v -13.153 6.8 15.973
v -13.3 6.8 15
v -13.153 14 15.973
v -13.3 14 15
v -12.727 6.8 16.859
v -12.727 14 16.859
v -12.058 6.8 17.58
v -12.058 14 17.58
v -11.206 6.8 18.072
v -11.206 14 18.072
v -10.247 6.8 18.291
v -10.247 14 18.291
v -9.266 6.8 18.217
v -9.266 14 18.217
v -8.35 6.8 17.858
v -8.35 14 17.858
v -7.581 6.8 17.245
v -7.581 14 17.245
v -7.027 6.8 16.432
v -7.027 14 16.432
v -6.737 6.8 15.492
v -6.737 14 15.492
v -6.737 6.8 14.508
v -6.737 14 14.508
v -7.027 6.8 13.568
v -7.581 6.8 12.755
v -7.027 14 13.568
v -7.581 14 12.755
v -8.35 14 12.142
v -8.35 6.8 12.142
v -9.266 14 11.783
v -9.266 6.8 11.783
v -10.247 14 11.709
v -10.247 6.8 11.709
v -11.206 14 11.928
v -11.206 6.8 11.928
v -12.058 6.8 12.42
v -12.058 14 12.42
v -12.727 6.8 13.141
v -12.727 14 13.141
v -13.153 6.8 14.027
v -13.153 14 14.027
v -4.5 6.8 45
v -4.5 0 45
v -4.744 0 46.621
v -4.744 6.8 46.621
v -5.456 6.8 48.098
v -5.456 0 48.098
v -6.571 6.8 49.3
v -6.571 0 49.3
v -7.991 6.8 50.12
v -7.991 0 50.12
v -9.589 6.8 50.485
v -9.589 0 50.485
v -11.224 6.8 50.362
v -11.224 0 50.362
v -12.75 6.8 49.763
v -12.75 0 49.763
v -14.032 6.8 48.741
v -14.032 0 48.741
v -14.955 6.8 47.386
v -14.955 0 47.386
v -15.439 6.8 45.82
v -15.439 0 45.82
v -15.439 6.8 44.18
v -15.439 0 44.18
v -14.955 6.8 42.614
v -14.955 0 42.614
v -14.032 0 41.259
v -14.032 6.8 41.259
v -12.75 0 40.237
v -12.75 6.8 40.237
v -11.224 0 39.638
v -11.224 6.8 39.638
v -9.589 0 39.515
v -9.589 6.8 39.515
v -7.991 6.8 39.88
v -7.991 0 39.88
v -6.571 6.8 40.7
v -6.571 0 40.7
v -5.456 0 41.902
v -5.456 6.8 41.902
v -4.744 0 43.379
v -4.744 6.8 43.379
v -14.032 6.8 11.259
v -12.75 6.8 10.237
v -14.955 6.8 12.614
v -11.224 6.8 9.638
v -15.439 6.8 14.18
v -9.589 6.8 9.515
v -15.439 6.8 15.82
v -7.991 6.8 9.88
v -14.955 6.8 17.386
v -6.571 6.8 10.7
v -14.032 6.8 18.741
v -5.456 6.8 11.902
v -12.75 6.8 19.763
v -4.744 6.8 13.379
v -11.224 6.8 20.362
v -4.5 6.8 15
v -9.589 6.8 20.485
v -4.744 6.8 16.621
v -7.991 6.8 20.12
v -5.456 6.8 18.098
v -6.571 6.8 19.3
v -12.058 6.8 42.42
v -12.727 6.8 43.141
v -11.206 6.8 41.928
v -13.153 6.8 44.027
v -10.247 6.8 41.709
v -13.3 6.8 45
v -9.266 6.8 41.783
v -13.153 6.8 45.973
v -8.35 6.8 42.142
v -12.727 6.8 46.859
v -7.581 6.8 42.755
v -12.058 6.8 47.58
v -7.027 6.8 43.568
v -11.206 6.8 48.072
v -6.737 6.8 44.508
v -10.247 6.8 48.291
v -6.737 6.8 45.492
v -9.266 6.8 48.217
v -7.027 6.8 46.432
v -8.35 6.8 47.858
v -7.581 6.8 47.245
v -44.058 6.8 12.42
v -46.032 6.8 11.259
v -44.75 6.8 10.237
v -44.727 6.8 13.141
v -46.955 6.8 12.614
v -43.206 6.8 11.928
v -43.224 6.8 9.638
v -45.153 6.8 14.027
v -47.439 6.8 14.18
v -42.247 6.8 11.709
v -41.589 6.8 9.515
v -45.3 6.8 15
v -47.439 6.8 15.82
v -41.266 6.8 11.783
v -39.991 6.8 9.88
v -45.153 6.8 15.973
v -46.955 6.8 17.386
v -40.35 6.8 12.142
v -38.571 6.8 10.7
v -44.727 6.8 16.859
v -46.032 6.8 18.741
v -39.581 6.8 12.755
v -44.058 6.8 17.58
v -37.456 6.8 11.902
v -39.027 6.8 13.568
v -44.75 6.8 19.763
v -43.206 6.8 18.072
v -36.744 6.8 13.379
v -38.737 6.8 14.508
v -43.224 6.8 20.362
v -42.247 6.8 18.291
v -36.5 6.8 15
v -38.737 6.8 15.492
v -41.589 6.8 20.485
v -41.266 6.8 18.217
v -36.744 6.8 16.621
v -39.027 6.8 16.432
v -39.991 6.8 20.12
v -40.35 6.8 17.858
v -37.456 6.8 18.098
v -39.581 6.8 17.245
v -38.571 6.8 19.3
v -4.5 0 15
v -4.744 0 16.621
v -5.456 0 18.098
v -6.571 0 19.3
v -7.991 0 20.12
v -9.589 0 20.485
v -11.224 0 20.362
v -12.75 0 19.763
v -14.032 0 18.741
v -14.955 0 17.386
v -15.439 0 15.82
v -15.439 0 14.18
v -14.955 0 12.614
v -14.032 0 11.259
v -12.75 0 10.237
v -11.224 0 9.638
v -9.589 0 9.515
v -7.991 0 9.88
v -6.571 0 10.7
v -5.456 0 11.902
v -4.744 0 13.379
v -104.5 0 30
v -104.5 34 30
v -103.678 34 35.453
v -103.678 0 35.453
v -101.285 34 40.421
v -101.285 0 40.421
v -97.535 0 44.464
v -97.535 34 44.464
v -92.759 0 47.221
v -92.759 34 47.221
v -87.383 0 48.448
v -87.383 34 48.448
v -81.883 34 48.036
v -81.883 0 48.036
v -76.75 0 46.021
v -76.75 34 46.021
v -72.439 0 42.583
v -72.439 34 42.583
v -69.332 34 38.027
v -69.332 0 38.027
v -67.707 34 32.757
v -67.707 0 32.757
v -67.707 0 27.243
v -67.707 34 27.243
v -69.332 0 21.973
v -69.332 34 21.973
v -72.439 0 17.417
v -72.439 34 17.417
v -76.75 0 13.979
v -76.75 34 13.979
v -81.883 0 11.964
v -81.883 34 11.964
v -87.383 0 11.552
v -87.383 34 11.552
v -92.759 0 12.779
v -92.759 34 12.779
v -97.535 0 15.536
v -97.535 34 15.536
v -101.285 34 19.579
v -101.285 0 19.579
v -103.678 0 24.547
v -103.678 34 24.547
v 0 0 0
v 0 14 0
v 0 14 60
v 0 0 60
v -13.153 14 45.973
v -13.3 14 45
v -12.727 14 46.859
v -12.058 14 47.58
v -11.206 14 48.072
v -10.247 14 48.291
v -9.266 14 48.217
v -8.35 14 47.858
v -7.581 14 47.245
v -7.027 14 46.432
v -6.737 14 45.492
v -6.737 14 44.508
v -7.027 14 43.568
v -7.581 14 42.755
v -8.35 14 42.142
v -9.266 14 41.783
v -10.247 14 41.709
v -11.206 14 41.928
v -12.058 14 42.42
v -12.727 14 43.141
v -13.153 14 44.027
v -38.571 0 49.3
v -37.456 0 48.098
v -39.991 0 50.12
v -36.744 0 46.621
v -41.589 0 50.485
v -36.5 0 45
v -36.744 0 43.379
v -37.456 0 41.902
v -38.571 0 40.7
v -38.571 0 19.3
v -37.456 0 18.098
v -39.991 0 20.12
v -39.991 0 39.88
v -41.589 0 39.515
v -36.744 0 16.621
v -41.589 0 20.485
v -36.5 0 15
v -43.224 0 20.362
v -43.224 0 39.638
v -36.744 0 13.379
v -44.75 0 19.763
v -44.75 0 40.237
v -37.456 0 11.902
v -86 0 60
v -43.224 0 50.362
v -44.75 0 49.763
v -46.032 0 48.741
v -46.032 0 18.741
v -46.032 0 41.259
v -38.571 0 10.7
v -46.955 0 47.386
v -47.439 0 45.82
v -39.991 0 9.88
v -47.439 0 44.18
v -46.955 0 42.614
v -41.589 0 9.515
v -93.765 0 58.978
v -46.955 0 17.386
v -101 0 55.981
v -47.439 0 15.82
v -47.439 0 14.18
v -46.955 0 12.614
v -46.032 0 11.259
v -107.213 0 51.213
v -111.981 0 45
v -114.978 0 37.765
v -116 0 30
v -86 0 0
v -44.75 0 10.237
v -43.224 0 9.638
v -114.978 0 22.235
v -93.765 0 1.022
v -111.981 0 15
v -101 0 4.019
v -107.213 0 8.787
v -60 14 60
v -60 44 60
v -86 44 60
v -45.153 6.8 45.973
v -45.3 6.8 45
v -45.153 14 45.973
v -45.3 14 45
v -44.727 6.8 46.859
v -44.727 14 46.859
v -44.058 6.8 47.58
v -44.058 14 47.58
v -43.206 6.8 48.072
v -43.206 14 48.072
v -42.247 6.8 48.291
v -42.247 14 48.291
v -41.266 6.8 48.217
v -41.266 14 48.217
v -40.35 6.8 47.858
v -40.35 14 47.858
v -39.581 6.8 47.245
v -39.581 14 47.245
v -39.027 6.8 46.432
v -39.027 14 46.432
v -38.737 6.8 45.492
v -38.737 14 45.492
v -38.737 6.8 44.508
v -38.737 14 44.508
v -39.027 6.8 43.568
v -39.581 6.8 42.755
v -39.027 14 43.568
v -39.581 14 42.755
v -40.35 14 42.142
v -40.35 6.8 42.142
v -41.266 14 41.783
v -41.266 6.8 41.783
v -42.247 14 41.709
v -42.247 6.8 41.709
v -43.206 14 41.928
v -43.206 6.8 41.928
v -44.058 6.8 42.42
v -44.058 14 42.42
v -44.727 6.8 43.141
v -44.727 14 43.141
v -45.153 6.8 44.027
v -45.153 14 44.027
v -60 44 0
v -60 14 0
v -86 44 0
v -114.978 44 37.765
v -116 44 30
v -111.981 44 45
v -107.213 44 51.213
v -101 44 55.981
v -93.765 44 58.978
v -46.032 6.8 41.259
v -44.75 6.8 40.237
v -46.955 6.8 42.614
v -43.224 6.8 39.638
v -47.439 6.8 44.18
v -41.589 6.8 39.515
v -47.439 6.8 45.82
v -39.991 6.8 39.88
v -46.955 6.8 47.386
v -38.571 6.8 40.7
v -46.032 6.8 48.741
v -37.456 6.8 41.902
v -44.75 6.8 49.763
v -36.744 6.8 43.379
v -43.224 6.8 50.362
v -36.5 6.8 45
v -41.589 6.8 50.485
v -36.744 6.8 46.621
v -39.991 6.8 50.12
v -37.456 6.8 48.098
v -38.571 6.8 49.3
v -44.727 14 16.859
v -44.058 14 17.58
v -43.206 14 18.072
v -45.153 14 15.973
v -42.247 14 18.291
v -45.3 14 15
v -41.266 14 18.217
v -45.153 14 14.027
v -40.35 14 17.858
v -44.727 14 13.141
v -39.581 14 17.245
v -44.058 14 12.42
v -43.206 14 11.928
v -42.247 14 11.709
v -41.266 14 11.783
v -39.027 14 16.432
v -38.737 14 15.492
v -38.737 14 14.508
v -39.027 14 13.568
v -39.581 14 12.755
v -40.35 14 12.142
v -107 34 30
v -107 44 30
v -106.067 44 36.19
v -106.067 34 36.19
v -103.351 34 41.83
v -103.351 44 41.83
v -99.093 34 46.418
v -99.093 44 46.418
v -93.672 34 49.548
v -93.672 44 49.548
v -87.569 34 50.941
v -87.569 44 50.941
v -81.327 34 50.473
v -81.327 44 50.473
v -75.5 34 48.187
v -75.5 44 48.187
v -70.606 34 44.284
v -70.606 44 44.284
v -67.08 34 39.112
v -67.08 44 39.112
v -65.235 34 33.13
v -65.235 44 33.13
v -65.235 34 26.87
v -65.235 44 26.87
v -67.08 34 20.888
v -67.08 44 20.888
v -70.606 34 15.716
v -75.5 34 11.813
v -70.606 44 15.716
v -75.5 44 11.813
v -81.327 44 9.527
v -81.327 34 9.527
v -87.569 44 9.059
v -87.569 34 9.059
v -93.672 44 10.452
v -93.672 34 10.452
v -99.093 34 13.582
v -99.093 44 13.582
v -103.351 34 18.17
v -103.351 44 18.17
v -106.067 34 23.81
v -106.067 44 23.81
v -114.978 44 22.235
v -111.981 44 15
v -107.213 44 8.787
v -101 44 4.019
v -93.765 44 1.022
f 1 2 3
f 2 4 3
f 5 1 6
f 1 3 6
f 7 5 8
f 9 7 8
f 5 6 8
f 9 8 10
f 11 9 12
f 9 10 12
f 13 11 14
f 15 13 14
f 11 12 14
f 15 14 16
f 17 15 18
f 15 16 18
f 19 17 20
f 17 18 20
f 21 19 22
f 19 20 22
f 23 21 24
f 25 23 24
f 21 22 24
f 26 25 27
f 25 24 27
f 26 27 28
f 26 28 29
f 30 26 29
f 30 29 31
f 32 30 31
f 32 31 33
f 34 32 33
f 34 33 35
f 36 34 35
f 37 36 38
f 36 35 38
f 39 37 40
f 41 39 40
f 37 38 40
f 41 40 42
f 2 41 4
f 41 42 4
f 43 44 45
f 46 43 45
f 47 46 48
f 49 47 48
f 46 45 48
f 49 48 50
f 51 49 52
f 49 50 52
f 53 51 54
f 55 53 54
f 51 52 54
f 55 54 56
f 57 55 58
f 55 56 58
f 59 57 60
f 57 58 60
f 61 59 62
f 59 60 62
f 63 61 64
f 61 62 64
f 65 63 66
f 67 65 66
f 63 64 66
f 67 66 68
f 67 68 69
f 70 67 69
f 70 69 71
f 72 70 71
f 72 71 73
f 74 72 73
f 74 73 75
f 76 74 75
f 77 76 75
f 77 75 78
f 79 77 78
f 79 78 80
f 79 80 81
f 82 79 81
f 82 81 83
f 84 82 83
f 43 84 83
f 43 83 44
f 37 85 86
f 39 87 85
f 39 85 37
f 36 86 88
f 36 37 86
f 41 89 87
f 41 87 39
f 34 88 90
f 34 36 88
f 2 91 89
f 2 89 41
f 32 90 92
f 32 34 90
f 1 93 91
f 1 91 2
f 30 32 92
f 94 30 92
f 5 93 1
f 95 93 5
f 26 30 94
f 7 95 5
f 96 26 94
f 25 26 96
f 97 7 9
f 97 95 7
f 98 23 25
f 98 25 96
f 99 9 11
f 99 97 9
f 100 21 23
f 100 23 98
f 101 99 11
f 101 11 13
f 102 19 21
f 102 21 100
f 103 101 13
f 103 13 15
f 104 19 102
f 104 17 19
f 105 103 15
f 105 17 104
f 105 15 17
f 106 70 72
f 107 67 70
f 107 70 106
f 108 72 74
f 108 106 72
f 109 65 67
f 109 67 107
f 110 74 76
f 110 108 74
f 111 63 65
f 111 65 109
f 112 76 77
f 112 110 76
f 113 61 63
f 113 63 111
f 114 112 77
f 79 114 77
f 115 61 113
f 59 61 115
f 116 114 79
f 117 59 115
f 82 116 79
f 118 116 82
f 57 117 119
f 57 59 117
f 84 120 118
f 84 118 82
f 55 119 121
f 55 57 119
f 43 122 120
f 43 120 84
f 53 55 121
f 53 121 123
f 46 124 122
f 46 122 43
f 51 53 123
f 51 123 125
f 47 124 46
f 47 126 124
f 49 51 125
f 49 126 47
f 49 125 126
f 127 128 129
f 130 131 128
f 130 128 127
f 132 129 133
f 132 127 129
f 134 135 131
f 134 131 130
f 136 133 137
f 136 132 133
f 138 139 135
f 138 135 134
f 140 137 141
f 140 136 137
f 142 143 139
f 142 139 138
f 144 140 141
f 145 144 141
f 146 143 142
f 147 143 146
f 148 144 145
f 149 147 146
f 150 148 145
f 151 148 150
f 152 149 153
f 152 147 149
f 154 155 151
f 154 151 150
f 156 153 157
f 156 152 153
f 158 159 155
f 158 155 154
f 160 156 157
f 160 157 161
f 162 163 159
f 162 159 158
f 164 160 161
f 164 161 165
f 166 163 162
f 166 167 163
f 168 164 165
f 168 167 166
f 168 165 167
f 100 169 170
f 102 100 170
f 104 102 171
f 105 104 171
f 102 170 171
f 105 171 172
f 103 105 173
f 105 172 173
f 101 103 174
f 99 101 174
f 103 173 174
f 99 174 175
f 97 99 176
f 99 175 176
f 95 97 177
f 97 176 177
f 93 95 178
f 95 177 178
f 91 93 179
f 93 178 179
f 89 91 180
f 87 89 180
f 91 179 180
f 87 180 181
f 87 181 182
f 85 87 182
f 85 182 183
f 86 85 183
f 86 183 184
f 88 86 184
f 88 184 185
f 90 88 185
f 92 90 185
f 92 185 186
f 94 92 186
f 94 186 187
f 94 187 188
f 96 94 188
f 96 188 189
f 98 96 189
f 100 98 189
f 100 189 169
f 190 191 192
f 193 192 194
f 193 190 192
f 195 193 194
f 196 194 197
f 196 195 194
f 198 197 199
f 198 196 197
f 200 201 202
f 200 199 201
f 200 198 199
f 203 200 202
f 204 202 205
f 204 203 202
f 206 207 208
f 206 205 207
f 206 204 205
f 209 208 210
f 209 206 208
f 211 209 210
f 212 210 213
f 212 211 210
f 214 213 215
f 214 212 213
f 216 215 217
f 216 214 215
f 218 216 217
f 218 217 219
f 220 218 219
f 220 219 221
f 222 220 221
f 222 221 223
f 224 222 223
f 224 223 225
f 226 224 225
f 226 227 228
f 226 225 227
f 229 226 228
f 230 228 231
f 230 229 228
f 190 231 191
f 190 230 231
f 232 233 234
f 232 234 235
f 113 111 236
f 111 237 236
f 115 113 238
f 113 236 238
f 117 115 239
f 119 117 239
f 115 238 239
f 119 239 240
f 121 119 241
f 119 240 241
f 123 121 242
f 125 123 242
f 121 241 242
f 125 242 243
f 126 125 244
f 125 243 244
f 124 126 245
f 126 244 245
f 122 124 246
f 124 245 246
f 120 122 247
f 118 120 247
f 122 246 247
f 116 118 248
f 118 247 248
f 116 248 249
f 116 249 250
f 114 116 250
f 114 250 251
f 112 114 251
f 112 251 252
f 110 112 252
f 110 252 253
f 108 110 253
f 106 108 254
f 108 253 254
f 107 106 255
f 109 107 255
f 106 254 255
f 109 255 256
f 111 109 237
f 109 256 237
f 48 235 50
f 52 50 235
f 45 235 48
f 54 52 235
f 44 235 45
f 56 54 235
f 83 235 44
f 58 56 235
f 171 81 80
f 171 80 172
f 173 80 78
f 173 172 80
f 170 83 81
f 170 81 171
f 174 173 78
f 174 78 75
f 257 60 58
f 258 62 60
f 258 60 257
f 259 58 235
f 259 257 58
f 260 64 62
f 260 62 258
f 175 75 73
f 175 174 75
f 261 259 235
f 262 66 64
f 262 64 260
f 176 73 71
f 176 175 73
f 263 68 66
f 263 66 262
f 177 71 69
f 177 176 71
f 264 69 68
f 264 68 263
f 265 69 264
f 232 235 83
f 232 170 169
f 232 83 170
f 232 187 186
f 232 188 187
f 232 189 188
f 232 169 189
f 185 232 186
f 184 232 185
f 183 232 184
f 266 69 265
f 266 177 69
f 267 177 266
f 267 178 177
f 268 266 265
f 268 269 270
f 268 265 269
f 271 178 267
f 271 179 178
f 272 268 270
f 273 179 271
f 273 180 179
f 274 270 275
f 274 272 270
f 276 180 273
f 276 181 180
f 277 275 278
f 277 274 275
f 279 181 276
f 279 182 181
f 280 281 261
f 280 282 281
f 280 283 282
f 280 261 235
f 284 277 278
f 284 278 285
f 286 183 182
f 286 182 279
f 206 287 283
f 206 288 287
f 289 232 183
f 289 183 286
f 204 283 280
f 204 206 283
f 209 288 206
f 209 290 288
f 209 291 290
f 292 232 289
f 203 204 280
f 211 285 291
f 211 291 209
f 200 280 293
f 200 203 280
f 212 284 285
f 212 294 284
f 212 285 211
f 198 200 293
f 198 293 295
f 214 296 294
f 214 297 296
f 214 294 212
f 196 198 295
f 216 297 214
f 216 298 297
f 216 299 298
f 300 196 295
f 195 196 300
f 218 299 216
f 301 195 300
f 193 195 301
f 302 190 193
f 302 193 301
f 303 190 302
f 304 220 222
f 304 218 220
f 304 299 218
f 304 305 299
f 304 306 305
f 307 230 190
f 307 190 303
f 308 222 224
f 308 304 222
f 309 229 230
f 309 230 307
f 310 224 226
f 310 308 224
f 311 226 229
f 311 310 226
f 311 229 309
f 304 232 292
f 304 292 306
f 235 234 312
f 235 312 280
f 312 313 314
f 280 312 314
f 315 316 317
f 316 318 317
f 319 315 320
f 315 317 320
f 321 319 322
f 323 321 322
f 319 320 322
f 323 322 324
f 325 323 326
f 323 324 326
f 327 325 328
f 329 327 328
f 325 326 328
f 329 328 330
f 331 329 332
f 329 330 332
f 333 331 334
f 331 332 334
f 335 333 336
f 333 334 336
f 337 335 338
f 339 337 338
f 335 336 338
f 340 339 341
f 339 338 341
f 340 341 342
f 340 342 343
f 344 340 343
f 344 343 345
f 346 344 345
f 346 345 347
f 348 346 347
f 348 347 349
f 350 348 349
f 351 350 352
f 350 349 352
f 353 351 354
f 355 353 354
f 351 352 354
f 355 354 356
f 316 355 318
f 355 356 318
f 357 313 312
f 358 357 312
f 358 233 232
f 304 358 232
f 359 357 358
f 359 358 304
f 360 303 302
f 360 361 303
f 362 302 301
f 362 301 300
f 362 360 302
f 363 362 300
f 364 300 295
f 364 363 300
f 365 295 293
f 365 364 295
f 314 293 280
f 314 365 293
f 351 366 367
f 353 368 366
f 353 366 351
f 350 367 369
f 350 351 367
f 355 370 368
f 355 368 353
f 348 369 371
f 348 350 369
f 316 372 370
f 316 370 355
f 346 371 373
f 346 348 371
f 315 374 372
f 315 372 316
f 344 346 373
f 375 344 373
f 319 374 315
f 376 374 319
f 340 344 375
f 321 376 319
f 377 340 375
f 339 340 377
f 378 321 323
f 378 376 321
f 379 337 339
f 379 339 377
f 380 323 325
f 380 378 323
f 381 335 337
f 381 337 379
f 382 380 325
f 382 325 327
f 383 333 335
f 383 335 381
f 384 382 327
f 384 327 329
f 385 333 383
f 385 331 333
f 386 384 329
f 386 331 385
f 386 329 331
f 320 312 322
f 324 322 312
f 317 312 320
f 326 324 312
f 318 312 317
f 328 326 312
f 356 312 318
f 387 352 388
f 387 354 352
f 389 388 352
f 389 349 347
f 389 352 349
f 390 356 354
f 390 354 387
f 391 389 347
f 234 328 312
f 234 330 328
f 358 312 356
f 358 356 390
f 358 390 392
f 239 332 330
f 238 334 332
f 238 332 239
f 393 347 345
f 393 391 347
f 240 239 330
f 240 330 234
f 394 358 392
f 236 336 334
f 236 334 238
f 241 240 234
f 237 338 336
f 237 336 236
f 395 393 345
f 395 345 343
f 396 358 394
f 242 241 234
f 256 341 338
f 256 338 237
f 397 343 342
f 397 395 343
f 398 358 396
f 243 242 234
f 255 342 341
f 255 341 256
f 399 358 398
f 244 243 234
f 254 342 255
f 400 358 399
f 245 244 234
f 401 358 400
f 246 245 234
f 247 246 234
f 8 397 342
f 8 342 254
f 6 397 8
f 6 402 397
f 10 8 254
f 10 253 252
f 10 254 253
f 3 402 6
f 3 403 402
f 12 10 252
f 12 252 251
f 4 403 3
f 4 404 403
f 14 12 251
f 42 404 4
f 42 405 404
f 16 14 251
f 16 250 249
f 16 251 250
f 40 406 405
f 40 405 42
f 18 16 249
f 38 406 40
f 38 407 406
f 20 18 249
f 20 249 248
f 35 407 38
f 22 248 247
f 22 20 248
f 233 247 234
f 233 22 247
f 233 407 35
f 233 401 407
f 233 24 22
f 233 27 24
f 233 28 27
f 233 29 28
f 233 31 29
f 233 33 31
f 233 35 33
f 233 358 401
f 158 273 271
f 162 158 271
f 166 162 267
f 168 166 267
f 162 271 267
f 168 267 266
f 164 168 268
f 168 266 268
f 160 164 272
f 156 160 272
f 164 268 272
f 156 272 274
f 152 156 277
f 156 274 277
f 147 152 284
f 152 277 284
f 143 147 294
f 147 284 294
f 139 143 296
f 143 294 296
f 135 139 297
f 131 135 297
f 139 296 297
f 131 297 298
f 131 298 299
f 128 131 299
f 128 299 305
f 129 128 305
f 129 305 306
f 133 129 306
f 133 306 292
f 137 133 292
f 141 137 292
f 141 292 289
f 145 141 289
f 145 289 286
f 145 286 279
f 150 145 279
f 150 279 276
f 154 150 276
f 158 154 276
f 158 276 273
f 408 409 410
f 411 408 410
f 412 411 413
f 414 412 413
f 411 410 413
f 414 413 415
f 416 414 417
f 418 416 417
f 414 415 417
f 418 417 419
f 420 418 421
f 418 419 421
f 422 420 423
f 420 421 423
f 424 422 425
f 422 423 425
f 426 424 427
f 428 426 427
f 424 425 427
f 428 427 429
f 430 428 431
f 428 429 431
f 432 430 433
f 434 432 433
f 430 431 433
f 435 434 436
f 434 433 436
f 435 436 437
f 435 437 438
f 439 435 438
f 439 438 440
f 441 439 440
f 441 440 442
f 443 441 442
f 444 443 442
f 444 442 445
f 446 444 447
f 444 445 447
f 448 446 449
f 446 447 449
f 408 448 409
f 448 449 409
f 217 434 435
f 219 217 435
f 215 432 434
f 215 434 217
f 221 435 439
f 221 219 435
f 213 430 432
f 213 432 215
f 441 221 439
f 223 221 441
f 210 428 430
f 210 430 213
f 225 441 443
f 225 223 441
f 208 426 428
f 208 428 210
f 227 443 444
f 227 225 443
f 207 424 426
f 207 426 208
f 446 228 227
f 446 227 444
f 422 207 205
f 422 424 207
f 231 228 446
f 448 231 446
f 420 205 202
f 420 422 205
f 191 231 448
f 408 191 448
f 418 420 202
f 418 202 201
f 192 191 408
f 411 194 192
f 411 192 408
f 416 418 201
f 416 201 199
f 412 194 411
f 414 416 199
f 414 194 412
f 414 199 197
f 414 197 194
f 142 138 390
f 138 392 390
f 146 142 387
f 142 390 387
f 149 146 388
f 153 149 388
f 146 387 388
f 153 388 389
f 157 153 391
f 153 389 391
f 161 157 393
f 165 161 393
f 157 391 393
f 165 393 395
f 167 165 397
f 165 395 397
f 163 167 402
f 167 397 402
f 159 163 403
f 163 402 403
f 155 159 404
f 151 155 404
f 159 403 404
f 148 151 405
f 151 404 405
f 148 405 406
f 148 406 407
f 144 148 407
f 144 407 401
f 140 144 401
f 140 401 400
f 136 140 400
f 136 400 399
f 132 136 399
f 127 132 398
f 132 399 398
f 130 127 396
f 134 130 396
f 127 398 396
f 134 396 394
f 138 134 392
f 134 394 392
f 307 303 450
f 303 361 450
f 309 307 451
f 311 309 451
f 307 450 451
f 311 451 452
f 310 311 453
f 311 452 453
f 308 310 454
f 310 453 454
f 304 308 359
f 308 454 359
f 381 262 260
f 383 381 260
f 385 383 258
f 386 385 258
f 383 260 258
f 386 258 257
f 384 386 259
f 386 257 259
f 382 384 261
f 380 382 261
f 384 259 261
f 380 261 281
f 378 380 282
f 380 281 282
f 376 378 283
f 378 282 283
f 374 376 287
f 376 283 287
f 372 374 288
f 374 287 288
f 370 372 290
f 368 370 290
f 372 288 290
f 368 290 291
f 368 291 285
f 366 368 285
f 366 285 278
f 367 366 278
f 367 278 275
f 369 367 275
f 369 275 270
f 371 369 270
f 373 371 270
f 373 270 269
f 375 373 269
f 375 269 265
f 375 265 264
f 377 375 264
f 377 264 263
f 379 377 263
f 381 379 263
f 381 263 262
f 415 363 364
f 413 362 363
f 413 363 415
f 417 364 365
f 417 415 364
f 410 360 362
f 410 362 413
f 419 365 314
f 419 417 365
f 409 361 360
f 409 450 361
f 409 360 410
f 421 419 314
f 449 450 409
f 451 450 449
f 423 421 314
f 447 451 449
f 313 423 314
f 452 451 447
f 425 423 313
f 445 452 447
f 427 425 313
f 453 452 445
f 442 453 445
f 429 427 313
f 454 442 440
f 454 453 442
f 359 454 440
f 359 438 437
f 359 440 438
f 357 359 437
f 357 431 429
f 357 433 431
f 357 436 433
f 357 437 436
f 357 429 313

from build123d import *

# Parameters (mm, degrees)
EXTRUDE_1_DEPTH              = 60
FILLET_1_R                   = 30
SKETCH_2_R                   = 21
CUT_EXTRUDE_1_DEPTH          = 10
CUT_EXTRUDE_2_DEPTH          = 135.951843263
CUT_EXTRUDE_2_DEPTH_BACK     = 135.951843263
SKETCH_3_R                   = 18.5
HOLE_WIZARD_M6_1_D           = 6.6
HOLE_WIZARD_M6_1_CBORE_D     = 11
HOLE_WIZARD_M6_1_CBORE_DEPTH = 6.8


with BuildPart() as part:
    # 草图1 → 凸台-拉伸1 (new body)
    with BuildSketch(Plane.XY):
        Polygon((0, 0), (-116, 0), (-116, 44), (-60, 44), (-60, 14), (0, 14), align=None)
    extrude(amount=EXTRUDE_1_DEPTH)

    # 圆角1
    fillet_1_edges = [part.edges().sort_by_distance(p)[0] for p in [
        (-116, 22, 60),
        (-116, 22, 0),
    ]]
    fillet(fillet_1_edges, radius=FILLET_1_R - 0.0001)  # a hair under: the kernel refuses the full size

    # 草图2 → 切除-拉伸1 (cut)
    with BuildSketch(Plane(origin=(0, 44, 0), x_dir=(1, 0, 0), z_dir=(0, 1, 0))):
        with Locations(Location((-86, -30, 0), (0, 0, 180))):
            Circle(SKETCH_2_R)
    extrude(amount=-CUT_EXTRUDE_1_DEPTH, mode=Mode.SUBTRACT)

    # 草图3 → 切除-拉伸2 (cut, two sides: drawn at the far end of the back side and taken through both)
    with BuildSketch(Plane(origin=(0, 34, 0), x_dir=(1, 0, 0), z_dir=(0, 1, 0)).offset(-CUT_EXTRUDE_2_DEPTH_BACK)):
        with Locations(Location((-86, -30, 0), (0, 0, 180))):
            Circle(SKETCH_3_R)
    extrude(amount=CUT_EXTRUDE_2_DEPTH + CUT_EXTRUDE_2_DEPTH_BACK, mode=Mode.SUBTRACT)

    # M6 六角圆柱头螺钉的柱形沉头孔1 (through all)
    with Locations(Plane.XZ):
        with Locations((-10, 45), (-42, 15), (-42, 45), (-10, 15)):
            CounterBoreHole(HOLE_WIZARD_M6_1_D / 2, HOLE_WIZARD_M6_1_CBORE_D / 2, HOLE_WIZARD_M6_1_CBORE_DEPTH)


solid = part.part
